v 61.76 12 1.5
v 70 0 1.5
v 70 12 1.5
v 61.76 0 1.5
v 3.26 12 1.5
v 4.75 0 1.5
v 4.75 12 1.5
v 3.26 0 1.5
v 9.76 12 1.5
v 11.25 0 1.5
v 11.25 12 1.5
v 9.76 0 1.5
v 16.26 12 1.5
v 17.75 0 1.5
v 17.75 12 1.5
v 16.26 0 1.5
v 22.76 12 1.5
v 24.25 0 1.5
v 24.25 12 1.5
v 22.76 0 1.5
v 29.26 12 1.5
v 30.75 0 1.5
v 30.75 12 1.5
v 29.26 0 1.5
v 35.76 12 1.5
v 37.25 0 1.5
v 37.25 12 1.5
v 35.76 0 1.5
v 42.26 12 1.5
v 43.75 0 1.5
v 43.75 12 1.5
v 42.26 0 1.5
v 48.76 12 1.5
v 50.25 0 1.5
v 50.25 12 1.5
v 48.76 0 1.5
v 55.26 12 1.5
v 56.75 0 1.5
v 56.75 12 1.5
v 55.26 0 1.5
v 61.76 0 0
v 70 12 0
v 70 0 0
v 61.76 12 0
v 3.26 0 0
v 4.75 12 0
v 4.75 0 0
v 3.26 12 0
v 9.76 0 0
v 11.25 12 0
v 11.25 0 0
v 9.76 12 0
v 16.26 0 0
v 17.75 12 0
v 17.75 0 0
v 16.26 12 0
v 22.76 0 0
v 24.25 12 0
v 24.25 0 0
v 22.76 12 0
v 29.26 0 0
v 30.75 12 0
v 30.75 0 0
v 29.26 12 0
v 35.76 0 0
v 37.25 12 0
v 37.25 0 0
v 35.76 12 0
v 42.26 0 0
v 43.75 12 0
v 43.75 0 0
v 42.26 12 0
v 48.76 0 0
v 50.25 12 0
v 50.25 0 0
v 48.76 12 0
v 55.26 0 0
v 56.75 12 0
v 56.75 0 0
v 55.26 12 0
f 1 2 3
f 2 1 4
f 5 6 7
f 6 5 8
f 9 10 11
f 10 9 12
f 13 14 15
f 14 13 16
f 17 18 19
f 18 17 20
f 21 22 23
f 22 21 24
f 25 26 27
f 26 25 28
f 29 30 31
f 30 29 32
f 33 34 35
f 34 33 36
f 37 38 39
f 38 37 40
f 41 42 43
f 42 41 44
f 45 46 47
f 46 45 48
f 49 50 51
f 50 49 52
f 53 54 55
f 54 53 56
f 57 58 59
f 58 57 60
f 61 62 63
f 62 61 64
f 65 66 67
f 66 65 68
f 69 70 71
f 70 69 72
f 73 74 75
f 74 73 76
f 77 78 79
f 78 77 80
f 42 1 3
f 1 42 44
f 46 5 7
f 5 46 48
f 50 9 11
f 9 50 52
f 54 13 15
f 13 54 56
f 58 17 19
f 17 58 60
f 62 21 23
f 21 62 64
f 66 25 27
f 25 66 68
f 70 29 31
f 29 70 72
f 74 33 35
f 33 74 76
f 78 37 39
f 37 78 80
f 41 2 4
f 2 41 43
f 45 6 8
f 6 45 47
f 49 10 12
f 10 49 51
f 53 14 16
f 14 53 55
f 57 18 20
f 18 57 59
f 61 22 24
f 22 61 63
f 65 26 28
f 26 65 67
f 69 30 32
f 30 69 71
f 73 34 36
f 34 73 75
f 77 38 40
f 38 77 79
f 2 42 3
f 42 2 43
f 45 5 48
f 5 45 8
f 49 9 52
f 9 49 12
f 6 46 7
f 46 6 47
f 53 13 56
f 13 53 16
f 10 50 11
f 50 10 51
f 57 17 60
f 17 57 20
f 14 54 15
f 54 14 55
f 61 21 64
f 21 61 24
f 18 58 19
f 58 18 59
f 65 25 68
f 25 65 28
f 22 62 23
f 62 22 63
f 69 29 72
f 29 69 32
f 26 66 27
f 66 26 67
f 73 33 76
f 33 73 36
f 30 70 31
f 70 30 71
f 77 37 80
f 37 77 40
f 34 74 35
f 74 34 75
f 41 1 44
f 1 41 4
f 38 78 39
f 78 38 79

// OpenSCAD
// Agarose gel comb - a flat plate with a back bar and a row of rectangular teeth, for casting
// horizontal gels. NOVEL general part.
//

cols   = 10;
teeth_d = 5.0;
teeth_l = 12;
pitch  = 1.5;
bar_w   = 12;
t       = 1.5;

$fn = 48;

p2  = teeth_d + pitch;                 // centre-to-centre pitch
over = min(t/2, pitch/2);              // butt the teeth into the bar so no gap at the joint
L   = 70;                              // spine length (X)

difference() {
    union() {
        cube([L, bar_w, t]);                 // spine (back bar)
        for (i = [0 : cols - 1])
            translate([-(teeth_d / 2 - over) + i * p2, 0, 0]) cube([teeth_d, teeth_l, t]);   // teeth
    }
    for (i = [0 : cols - 1])
        translate([-(teeth_d / 2 - over) + i * p2, 0, -1]) cube([teeth_d + 0.01, teeth_l, t + 2]);   // pocket (open top) in each tooth
}
